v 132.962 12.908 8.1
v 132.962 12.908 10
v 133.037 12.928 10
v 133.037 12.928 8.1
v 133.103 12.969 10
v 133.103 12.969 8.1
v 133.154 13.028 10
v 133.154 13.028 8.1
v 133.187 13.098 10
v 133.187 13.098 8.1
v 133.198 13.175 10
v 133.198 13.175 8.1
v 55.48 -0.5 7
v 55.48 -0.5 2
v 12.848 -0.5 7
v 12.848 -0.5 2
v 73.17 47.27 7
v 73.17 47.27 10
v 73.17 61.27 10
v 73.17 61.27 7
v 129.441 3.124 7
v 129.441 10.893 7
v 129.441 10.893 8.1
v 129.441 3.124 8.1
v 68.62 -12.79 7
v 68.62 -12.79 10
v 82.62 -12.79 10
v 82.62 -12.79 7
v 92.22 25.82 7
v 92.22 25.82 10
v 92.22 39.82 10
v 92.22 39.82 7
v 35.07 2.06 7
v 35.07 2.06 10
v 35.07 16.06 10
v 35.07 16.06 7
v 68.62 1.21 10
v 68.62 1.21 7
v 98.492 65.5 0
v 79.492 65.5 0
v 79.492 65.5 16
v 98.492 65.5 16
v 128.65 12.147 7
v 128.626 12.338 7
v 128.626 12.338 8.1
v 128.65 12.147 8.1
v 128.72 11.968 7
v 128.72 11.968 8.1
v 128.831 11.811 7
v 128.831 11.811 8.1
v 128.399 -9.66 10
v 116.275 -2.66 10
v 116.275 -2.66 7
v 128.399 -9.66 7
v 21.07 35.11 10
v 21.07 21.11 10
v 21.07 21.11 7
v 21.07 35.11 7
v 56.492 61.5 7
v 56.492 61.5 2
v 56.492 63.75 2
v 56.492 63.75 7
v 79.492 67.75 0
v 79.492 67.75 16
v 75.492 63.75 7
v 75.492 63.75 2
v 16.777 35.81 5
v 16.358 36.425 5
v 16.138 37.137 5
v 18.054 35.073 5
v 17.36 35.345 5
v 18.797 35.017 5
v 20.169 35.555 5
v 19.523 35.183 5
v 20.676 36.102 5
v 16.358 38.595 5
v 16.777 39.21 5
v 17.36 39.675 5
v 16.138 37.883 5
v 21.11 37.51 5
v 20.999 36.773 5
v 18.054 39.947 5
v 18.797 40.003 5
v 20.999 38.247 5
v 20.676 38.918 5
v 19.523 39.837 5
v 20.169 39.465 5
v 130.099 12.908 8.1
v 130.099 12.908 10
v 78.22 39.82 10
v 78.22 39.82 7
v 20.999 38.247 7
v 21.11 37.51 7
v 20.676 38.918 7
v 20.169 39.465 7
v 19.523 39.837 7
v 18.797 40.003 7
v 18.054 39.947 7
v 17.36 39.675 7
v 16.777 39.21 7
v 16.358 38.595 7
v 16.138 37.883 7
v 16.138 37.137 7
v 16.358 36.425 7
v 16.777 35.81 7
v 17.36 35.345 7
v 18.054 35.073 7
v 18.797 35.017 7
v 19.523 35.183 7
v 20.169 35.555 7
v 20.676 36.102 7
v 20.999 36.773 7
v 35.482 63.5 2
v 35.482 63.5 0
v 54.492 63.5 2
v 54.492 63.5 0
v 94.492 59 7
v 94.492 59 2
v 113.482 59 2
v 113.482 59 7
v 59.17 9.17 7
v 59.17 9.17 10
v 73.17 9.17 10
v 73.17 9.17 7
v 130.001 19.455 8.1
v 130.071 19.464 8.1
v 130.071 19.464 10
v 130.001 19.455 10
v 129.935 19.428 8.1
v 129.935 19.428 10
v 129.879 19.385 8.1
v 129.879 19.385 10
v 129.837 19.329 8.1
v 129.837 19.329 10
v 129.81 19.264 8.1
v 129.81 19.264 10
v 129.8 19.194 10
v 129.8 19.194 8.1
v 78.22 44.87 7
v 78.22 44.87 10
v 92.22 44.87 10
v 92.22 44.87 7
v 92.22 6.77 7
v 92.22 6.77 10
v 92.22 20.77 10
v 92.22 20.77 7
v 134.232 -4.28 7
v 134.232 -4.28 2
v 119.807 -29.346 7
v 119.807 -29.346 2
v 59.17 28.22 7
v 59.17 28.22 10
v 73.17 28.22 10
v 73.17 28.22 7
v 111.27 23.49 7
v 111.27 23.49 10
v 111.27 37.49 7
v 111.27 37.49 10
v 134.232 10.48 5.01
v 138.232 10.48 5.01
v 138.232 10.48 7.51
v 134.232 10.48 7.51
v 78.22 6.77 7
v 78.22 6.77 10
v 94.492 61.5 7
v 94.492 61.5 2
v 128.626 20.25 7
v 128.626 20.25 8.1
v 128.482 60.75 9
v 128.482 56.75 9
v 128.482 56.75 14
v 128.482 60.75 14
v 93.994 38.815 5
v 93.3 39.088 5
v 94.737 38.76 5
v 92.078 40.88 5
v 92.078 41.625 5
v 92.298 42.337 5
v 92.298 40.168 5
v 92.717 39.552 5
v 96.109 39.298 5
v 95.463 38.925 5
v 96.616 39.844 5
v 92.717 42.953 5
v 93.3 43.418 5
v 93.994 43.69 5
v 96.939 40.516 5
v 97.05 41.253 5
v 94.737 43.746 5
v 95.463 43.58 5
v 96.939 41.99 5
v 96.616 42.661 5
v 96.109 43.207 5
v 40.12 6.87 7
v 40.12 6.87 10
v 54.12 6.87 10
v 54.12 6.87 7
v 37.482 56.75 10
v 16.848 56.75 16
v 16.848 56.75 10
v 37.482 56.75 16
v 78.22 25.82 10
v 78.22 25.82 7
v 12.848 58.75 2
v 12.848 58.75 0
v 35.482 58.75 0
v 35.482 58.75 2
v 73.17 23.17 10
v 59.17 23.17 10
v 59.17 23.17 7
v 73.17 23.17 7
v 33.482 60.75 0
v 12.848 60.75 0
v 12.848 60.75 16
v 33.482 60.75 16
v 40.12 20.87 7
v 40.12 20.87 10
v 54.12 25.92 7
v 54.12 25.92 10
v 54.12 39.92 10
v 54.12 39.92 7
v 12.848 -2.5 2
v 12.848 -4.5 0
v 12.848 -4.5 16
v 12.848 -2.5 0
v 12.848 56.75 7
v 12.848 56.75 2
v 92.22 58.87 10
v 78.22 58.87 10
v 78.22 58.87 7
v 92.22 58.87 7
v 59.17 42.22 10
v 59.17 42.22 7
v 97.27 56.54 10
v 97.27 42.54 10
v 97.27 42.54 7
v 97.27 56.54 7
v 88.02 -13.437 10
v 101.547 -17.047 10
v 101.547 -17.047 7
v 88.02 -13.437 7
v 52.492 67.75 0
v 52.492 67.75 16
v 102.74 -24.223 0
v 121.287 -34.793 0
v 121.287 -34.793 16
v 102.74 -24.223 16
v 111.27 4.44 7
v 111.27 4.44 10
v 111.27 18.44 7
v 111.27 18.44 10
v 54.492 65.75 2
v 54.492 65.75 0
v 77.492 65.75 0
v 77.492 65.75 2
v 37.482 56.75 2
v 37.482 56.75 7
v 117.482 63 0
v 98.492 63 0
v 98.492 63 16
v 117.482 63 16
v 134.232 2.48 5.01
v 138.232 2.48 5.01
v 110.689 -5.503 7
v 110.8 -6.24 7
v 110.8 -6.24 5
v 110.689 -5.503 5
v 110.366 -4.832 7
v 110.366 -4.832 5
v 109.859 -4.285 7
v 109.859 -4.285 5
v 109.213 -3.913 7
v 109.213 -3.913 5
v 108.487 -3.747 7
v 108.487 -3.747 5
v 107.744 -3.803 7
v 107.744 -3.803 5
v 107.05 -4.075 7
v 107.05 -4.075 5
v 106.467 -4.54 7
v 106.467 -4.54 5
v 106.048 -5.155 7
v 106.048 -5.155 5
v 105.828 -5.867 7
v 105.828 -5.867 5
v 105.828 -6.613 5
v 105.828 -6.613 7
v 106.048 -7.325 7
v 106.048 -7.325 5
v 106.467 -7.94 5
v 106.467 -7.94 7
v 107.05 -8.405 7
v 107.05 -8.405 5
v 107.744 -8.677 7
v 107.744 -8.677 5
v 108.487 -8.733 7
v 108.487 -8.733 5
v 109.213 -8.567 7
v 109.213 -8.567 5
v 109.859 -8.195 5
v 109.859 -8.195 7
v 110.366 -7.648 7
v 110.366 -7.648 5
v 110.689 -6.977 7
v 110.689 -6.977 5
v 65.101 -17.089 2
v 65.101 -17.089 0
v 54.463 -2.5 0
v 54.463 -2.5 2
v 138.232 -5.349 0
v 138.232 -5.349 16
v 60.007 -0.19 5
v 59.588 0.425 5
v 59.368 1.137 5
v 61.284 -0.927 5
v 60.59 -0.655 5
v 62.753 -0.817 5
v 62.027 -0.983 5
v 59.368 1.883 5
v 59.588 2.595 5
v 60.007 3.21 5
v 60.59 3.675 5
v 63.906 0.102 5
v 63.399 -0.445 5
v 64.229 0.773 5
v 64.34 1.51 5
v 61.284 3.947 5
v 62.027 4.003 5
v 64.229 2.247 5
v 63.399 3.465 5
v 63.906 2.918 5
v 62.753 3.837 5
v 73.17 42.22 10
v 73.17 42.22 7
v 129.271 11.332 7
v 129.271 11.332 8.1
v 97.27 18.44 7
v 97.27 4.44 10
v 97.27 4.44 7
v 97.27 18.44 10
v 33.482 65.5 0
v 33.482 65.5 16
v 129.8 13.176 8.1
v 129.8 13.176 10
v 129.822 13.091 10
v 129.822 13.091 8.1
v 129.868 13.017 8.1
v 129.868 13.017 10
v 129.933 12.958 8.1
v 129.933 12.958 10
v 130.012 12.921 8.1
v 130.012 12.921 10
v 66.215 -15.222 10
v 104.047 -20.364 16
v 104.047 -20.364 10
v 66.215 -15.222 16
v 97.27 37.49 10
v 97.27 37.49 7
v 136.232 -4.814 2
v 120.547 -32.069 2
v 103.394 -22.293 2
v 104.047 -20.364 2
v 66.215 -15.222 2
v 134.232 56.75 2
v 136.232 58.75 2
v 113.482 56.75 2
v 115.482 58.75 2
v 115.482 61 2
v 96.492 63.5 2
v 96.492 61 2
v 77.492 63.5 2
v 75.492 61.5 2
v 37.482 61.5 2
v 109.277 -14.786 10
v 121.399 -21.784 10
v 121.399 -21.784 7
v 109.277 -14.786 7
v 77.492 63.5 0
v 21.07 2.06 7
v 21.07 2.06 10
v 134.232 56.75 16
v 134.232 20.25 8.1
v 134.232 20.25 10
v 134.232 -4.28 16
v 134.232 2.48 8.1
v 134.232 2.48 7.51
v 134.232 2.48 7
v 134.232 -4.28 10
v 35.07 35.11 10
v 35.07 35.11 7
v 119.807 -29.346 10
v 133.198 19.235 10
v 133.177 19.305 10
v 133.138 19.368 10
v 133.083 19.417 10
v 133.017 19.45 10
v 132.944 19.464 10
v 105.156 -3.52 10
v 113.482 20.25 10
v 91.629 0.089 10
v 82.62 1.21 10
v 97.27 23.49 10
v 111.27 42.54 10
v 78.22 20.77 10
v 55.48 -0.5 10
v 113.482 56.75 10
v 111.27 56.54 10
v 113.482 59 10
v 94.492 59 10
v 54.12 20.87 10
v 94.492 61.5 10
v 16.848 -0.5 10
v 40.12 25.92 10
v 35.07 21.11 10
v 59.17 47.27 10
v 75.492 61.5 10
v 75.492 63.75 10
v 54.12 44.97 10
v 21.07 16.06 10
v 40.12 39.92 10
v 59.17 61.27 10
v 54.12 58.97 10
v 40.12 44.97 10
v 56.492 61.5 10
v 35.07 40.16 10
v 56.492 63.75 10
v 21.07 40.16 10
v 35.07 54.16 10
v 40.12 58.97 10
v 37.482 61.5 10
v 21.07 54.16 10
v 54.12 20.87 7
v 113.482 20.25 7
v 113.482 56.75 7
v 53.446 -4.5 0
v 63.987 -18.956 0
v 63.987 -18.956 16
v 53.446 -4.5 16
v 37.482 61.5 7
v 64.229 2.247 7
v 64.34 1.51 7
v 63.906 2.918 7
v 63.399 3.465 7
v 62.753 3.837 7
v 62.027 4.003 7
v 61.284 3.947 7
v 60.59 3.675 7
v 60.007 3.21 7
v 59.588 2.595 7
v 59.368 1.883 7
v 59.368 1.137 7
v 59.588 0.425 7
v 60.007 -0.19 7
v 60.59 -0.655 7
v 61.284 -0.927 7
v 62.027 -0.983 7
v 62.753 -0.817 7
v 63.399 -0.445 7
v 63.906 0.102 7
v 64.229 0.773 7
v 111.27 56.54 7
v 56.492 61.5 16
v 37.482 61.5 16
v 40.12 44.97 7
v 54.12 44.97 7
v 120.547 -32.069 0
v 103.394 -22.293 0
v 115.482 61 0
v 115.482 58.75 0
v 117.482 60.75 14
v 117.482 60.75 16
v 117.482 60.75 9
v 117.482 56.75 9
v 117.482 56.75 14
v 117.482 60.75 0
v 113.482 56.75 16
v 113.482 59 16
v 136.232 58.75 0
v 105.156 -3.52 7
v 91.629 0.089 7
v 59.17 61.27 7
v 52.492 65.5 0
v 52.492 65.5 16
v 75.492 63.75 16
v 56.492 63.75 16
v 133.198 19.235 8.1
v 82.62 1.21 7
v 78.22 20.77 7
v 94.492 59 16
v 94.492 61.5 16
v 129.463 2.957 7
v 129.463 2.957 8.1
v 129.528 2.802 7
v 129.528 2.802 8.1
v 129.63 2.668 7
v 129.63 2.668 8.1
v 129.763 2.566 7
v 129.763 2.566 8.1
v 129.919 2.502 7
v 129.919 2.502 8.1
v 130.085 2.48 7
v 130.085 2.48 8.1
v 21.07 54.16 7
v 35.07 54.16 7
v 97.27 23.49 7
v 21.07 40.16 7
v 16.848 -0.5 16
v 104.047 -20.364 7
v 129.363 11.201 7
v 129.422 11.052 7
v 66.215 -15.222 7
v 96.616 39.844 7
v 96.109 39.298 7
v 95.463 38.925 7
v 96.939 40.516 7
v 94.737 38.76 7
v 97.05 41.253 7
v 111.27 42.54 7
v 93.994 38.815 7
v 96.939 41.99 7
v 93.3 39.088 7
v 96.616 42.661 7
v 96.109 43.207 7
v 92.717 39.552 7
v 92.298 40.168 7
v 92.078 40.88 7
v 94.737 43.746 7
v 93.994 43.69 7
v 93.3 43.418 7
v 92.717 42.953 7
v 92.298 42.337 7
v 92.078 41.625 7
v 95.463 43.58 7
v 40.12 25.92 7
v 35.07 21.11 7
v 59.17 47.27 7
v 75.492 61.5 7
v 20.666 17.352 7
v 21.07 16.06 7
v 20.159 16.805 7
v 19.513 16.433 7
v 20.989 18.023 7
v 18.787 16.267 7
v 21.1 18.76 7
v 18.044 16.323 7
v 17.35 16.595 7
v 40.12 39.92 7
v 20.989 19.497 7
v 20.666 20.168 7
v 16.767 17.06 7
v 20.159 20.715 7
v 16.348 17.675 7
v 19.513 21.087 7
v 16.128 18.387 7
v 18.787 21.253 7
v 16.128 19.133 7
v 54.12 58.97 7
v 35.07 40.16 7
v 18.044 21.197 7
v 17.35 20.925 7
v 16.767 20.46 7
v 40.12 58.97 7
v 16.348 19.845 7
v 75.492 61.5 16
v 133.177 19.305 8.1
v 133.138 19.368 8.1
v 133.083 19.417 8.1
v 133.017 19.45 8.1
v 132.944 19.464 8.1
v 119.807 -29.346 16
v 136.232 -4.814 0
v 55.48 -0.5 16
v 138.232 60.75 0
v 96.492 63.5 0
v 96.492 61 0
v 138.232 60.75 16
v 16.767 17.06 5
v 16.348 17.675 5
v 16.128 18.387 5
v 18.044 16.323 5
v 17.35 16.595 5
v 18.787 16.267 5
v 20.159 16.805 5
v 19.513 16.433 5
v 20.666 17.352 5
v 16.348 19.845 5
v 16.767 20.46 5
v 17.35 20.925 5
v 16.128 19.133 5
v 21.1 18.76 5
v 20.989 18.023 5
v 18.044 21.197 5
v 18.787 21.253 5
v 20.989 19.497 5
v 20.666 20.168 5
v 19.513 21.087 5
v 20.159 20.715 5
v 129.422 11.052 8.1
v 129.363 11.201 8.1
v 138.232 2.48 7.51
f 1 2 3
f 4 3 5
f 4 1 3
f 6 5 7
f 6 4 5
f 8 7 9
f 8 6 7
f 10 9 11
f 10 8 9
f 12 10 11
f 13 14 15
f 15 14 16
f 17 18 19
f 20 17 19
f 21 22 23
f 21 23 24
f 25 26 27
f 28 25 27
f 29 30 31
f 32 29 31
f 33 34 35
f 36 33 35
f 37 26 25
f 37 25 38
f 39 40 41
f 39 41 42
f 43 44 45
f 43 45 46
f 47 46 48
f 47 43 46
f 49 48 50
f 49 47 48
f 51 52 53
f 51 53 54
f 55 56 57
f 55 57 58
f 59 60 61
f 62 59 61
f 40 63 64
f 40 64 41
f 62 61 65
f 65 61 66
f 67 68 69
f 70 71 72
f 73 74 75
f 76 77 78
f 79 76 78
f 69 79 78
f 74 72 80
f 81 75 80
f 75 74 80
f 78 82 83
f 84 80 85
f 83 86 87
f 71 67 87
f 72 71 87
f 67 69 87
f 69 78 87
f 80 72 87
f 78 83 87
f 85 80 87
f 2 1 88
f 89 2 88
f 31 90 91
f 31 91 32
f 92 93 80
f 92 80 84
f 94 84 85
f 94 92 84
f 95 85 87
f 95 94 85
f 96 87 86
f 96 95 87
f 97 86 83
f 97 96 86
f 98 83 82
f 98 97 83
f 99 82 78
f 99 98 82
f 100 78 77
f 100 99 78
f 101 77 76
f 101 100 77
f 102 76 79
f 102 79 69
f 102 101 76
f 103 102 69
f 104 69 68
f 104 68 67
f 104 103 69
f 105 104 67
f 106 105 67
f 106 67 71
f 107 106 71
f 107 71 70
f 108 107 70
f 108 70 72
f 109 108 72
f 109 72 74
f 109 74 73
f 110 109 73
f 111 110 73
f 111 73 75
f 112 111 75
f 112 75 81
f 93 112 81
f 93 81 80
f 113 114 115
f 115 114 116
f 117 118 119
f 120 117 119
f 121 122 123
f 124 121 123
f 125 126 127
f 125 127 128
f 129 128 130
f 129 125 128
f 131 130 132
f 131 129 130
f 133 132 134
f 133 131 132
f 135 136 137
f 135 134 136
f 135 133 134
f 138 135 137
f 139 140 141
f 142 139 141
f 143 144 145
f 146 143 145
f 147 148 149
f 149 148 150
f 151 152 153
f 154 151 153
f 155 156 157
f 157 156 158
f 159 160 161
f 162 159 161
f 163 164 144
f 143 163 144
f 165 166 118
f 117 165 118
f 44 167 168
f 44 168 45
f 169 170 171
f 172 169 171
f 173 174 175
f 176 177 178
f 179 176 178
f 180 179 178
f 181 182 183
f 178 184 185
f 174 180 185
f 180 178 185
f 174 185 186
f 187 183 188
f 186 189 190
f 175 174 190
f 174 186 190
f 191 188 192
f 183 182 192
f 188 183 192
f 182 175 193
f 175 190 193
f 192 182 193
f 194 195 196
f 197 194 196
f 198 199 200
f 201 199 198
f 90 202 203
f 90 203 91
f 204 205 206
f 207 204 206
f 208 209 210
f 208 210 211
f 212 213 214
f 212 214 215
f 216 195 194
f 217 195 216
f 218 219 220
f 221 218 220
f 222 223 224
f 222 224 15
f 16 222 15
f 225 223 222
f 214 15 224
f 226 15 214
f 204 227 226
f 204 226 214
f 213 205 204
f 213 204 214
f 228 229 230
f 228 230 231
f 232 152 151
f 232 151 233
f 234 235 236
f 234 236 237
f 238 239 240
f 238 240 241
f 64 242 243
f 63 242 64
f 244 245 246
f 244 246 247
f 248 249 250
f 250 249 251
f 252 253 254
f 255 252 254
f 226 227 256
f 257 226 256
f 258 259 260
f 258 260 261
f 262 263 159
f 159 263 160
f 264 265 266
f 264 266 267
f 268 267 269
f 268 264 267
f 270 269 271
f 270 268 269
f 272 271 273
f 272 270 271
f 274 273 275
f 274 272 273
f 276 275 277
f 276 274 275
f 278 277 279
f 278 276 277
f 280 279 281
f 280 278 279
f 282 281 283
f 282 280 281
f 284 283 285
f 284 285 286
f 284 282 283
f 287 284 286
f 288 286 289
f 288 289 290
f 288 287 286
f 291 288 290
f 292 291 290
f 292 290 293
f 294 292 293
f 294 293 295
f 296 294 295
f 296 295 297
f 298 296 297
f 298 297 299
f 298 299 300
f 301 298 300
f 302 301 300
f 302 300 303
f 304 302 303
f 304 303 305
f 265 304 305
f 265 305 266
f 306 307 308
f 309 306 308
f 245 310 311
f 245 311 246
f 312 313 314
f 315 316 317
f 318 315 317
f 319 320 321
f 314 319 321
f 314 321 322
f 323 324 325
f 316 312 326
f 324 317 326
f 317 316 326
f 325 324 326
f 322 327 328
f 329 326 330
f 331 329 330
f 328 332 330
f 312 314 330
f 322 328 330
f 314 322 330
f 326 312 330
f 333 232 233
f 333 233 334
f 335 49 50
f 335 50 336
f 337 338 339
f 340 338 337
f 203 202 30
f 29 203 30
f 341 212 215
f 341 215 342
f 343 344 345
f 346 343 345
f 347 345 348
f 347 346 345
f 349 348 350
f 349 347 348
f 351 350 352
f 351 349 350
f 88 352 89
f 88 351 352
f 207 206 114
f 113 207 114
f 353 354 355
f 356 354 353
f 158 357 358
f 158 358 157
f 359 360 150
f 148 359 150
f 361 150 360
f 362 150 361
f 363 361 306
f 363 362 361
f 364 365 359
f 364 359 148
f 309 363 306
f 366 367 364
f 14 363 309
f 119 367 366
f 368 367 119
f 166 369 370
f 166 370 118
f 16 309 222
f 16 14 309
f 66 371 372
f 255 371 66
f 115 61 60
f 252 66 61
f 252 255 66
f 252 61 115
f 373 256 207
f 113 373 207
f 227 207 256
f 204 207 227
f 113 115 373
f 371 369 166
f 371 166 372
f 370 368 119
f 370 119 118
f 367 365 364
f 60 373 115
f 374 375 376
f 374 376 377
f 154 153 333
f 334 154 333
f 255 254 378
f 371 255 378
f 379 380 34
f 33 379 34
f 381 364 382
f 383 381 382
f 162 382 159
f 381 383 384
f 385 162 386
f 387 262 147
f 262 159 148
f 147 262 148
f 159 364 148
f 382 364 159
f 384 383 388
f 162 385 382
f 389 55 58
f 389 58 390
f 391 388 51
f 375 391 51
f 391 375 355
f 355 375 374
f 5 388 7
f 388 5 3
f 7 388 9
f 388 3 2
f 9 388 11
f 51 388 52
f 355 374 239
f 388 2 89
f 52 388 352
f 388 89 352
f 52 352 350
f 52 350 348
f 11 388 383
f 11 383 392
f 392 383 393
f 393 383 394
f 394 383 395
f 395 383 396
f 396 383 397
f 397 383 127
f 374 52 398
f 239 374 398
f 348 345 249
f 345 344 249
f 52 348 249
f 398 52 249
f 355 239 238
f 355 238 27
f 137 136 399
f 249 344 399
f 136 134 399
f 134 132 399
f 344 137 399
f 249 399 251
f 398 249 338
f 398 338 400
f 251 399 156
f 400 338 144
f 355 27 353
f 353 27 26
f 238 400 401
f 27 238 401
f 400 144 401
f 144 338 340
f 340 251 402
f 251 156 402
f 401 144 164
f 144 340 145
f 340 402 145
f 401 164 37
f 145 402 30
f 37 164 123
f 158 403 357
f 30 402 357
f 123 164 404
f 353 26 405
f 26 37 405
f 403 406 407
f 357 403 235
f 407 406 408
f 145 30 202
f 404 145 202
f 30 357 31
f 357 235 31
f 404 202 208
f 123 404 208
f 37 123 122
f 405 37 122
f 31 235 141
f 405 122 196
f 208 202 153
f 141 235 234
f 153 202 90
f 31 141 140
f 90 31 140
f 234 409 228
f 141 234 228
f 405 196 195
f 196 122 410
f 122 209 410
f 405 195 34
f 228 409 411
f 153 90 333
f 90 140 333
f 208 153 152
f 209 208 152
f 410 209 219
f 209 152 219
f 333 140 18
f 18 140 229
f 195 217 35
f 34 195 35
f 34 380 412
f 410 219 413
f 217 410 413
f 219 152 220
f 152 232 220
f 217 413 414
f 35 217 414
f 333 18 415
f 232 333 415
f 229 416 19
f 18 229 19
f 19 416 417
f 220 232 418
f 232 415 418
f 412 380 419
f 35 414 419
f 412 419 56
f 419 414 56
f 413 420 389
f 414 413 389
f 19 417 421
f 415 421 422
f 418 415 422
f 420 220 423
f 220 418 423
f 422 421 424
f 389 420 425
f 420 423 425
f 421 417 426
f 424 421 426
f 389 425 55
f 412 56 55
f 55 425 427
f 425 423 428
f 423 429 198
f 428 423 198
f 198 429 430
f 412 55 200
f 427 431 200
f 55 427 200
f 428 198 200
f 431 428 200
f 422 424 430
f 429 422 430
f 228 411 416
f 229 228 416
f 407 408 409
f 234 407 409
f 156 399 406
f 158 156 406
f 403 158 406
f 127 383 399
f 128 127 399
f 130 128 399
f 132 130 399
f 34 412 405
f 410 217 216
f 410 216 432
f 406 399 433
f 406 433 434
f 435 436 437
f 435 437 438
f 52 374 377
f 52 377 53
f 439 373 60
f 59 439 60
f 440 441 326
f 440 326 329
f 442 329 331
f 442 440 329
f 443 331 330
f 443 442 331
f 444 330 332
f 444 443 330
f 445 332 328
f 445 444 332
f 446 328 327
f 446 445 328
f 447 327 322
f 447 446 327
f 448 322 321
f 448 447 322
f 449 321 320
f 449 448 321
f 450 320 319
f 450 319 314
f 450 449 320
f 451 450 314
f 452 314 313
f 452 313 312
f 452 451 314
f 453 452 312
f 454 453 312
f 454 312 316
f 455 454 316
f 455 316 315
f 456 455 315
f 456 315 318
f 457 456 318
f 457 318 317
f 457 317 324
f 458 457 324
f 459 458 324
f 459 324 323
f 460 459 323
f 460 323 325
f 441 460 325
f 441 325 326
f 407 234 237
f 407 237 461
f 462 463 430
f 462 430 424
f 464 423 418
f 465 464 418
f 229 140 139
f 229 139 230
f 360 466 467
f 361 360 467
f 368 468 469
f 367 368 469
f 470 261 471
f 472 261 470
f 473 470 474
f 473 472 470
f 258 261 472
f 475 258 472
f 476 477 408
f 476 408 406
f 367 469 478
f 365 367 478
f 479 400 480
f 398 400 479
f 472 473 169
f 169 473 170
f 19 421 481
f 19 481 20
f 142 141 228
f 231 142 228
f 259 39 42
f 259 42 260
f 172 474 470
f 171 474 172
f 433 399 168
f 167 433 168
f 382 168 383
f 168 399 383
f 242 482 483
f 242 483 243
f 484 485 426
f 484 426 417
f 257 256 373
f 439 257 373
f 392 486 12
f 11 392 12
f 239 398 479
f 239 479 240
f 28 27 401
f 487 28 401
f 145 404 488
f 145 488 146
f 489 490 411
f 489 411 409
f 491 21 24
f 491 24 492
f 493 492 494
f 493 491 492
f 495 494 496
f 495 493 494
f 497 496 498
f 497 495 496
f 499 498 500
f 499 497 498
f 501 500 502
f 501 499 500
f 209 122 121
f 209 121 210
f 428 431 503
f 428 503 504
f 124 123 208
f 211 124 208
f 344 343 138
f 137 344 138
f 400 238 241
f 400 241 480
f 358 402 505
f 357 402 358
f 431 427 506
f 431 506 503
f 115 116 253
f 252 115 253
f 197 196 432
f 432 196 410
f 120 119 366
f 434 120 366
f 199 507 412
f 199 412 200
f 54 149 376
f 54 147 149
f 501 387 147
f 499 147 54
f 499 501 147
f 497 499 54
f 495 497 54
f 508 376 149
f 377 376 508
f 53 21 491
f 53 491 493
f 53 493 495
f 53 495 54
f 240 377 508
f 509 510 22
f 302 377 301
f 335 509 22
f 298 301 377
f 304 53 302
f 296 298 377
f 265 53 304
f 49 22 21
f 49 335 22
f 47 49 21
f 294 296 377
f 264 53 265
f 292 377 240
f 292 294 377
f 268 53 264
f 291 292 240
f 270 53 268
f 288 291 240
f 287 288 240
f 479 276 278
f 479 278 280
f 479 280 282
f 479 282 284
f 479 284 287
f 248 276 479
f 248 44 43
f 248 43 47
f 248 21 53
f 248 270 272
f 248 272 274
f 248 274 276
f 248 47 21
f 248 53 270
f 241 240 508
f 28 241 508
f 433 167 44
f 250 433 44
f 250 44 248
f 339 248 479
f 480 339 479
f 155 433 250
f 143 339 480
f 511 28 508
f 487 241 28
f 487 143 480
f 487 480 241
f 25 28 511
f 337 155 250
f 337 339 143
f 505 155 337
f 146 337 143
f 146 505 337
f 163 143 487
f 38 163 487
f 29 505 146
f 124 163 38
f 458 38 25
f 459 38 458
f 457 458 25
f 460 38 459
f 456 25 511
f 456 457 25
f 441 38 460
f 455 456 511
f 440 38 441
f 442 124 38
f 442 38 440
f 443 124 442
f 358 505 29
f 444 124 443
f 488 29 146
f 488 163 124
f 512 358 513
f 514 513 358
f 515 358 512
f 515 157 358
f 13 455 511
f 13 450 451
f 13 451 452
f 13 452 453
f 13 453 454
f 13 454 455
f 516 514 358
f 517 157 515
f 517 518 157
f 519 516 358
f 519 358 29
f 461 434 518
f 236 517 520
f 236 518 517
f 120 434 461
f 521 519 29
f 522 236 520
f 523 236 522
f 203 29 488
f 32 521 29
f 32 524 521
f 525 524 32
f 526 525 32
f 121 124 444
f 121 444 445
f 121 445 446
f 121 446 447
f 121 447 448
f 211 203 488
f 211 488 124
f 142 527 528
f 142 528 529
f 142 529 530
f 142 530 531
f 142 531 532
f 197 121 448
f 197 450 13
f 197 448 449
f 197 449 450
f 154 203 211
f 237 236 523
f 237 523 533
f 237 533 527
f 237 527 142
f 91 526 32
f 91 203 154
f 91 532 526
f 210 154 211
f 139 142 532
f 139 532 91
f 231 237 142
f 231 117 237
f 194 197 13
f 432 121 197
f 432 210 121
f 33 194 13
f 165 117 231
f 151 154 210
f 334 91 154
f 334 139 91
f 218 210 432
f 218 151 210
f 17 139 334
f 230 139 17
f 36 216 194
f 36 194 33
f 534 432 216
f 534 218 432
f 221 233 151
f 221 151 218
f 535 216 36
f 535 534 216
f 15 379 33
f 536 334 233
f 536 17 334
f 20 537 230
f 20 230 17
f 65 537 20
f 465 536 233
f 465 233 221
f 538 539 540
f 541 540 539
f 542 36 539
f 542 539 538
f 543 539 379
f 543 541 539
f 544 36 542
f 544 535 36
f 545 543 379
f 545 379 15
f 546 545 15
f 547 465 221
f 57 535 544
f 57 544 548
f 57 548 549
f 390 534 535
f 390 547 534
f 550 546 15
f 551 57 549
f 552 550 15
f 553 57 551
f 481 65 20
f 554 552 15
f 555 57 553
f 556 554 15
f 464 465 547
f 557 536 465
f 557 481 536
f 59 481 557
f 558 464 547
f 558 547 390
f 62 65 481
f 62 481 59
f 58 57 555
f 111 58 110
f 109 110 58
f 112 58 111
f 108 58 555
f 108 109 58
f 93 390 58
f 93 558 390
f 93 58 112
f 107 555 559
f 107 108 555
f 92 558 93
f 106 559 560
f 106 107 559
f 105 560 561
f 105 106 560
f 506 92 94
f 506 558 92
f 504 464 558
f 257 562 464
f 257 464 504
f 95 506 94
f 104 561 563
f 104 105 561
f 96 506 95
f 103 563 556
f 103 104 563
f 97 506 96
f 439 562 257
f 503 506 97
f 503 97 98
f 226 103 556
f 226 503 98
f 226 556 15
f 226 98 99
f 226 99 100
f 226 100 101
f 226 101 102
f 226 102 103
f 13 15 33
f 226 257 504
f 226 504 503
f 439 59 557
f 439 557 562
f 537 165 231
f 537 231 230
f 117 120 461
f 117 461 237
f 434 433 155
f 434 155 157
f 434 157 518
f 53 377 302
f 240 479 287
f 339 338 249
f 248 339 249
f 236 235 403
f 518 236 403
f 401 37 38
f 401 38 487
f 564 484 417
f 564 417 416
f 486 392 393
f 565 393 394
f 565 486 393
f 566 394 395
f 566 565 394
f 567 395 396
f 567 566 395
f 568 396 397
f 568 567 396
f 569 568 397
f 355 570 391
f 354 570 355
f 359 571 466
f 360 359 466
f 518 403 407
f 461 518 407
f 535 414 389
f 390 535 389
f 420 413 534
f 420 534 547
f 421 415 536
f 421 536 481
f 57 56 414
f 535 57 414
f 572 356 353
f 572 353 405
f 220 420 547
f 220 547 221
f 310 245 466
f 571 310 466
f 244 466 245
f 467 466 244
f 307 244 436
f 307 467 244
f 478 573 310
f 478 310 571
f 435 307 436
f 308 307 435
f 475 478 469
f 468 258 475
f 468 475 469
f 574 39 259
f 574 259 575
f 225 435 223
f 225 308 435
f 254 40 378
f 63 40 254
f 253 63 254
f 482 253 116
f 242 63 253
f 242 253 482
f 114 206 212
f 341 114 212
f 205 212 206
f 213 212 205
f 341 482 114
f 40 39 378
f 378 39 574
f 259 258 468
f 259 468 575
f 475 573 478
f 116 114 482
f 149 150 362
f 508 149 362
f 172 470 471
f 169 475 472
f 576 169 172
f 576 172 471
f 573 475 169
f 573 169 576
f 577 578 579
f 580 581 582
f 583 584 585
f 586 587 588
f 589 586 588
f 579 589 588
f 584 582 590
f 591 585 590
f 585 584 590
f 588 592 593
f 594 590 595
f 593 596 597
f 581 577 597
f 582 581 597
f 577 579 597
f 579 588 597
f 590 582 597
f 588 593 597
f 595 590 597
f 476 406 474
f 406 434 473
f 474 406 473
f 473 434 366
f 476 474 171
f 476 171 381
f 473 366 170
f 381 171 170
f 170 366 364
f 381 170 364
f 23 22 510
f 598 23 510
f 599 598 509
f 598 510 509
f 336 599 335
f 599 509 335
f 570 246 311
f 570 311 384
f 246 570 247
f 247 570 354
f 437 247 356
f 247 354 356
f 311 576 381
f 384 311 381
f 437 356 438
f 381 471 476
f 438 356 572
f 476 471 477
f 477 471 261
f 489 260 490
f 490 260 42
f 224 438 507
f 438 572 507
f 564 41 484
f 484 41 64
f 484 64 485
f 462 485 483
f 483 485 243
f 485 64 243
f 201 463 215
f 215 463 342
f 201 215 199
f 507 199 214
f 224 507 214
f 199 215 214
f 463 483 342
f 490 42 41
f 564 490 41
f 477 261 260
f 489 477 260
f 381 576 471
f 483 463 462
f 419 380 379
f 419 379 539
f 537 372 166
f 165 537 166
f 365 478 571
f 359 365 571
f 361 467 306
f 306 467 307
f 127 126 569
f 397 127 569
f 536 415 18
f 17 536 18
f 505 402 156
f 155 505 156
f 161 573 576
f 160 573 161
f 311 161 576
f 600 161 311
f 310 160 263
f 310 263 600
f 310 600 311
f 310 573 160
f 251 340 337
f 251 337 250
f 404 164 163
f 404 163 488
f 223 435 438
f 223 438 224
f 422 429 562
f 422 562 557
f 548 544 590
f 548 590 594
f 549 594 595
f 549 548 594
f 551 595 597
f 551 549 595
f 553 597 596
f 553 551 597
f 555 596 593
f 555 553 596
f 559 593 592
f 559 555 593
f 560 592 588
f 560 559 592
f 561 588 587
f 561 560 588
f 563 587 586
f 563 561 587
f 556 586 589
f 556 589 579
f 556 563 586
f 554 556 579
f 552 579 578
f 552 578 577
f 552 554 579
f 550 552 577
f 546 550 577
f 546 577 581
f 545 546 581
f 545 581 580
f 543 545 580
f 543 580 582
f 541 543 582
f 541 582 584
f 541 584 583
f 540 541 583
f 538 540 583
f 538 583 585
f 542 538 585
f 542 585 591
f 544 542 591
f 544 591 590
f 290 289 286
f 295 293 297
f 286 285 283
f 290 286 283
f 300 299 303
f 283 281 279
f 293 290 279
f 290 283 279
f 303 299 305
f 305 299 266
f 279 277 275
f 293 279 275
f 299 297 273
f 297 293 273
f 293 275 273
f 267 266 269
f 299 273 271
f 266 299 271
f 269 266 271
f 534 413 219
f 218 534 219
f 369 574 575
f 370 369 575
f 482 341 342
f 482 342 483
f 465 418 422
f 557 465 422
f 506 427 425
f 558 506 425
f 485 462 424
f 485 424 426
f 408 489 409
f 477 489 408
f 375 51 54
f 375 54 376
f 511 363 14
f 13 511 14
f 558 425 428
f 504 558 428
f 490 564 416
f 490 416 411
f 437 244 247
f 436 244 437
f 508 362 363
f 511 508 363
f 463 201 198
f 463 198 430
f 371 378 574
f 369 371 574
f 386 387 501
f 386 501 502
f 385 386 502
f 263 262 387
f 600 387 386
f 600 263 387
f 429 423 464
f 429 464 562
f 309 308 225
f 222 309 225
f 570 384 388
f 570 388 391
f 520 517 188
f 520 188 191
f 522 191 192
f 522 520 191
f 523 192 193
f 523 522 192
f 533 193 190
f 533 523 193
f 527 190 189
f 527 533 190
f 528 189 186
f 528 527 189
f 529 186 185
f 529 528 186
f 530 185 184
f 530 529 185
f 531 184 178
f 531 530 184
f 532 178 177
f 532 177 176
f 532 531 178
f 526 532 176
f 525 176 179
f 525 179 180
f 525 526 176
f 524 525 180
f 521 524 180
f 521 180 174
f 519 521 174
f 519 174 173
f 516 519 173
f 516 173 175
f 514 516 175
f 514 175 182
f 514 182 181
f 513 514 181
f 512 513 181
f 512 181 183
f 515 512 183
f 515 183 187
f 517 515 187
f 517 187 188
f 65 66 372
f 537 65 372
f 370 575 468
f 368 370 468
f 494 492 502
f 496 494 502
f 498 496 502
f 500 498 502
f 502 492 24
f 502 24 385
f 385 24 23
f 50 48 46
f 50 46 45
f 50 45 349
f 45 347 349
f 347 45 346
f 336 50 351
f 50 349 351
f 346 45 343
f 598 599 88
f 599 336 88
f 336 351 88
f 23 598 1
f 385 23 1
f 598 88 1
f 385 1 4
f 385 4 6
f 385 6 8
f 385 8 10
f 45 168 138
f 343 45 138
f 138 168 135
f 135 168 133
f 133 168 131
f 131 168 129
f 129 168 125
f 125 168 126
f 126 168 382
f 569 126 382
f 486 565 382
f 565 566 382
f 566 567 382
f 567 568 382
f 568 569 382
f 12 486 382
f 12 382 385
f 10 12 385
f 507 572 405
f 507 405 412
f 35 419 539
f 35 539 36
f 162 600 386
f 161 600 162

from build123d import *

# Parameters (mm, degrees)
PAD005_DEPTH        = 16
POCKET_DEPTH        = 6
POCKET012_DEPTH     = 7
SKETCH001_W         = 14
SKETCH001_H         = 14
SKETCH001_W_2       = 20.75
SKETCH001_H_2       = 36.5
POCKET013_DEPTH     = 3
MIRROREDSKETCH009_R = 2.5
PAD_DEPTH           = 5
SKETCH_W            = 8
SKETCH_H            = 2.5
POCKET014_DEPTH     = 5
SKETCH015_W         = 11
SKETCH015_H         = 5
POCKET015_DEPTH     = 7
POCKET018_DEPTH     = 2
POCKET025_DEPTH     = 5
POCKET026_DEPTH     = 1.1


with BuildPart() as part:
    # MirroredSketch002 → Pad005 (new body)
    with BuildSketch(Plane.XY):
        Polygon((12.847899, 60.749919), (33.482443, 60.749919), (33.482443, 65.499919), (52.492443, 65.499919), (52.492443, 67.749919), (79.492443, 67.749919), (79.492443, 65.499919), (98.492443, 65.499919), (98.492443, 62.999919), (117.482443, 62.999919), (117.482443, 60.749919), (138.232443, 60.749919), (138.232443, -5.348885), (121.287497, -34.793261), (102.74032, -24.222717), (63.98748, -18.955575), (53.446293, -4.5), (12.847899, -4.5), align=None)
    extrude(amount=PAD005_DEPTH)

    # MirroredSketch005 → Pocket (cut)
    with BuildSketch(Plane.XY.offset(16)):
        Polygon((16.847899, -0.5), (16.847899, 56.75), (37.482443, 56.75), (37.482443, 61.499919), (56.492443, 61.499919), (56.492443, 63.749919), (75.492443, 63.749919), (75.492443, 61.499919), (94.492443, 61.499919), (94.492443, 58.999919), (113.482443, 58.999919), (113.482443, 56.749919), (134.232443, 56.749919), (134.232443, -4.280081), (119.807428, -29.345701), (104.047316, -20.363581), (66.215158, -15.221576), (55.48, -0.5), align=None)
    extrude(amount=-POCKET_DEPTH, mode=Mode.SUBTRACT)

    # MirroredSketch006 → Pocket012 (cut)
    with BuildSketch(Plane.XY):
        Polygon((-0.5, -0.5), (-0.5, 56.75), (37.482443, 56.75), (37.482443, 61.499919), (56.492443, 61.499919), (56.492443, 63.749919), (75.492443, 63.749919), (75.492443, 61.499919), (94.492443, 61.499919), (94.492443, 58.999919), (113.482443, 58.999919), (113.482443, 56.749919), (134.232443, 56.749919), (134.232443, -4.280081), (119.807428, -29.345701), (104.047316, -20.363581), (66.215158, -15.221576), (55.48, -0.5), align=None)
    extrude(amount=POCKET012_DEPTH, mode=Mode.SUBTRACT)

    # Sketch001 → Pocket013 (cut)
    with BuildSketch(Plane.XY.offset(10)):
        with Locations((75.62, -5.79)):
            Rectangle(SKETCH001_W, SKETCH001_H)
        Polygon((91.629303, 0.089303), (105.156052, -3.52), (101.546749, -17.046749), (88.02, -13.437445), align=None)
        Polygon((116.274632, -2.66), (128.398988, -9.66), (121.398988, -21.784355), (109.276749, -14.785577), align=None)
        with Locations((28.07, 47.16)):
            Rectangle(SKETCH001_W, SKETCH001_H)
        with Locations((28.07, 9.06)):
            Rectangle(SKETCH001_W, SKETCH001_H)
        with Locations((47.12, 51.97)):
            Rectangle(SKETCH001_W, SKETCH001_H)
        with Locations((47.12, 13.87)):
            Rectangle(SKETCH001_W, SKETCH001_H)
        with Locations((66.17, 54.27)):
            Rectangle(SKETCH001_W, SKETCH001_H)
        with Locations((66.17, 16.17)):
            Rectangle(SKETCH001_W, SKETCH001_H)
        with Locations((85.22, 51.87)):
            Rectangle(SKETCH001_W, SKETCH001_H)
        with Locations((85.22, 13.77)):
            Rectangle(SKETCH001_W, SKETCH001_H)
        with Locations((104.27, 49.54)):
            Rectangle(SKETCH001_W, SKETCH001_H)
        with Locations((47.12, 32.92)):
            Rectangle(SKETCH001_W, SKETCH001_H)
        with Locations((66.17, 35.22)):
            Rectangle(SKETCH001_W, SKETCH001_H)
        with Locations((28.07, 28.11)):
            Rectangle(SKETCH001_W, SKETCH001_H)
        with Locations((104.27, 30.49)):
            Rectangle(SKETCH001_W, SKETCH001_H)
        with Locations((104.27, 11.44)):
            Rectangle(SKETCH001_W, SKETCH001_H)
        with Locations((85.22, 32.82)):
            Rectangle(SKETCH001_W, SKETCH001_H)
        with Locations((123.857443, 38.499919)):
            Rectangle(SKETCH001_W_2, SKETCH001_H_2)
    extrude(amount=-POCKET013_DEPTH, mode=Mode.SUBTRACT)

    # MirroredSketch009 → Pad (join)
    with BuildSketch(Plane.XY.offset(10)):
        with Locations((18.61, 37.509997)):
            Circle(MIRROREDSKETCH009_R)
        with Locations((18.6, 18.76)):
            Circle(MIRROREDSKETCH009_R)
        with Locations((94.55, 41.252659)):
            Circle(MIRROREDSKETCH009_R)
        with Locations((61.84, 1.51)):
            Circle(MIRROREDSKETCH009_R)
        with Locations((108.3, -6.24)):
            Circle(MIRROREDSKETCH009_R)
    extrude(amount=-PAD_DEPTH)

    # Sketch → Pocket014 (cut)
    with BuildSketch(Plane.YZ.offset(138.3)):
        with Locations((6.479556, 6.26)):
            Rectangle(SKETCH_W, SKETCH_H)
    extrude(amount=-POCKET014_DEPTH, mode=Mode.SUBTRACT)

    # Sketch015 → Pocket015 (cut)
    with BuildSketch(Plane(origin=(6, 56.73, -16.55), x_dir=(1, 0, 0), z_dir=(0, -1, 0))):
        with Locations((116.982443, 28.05)):
            Rectangle(SKETCH015_W, SKETCH015_H)
    extrude(amount=-POCKET015_DEPTH, mode=Mode.SUBTRACT)

    # MirroredSketch013 → Pocket018 (cut)
    with BuildSketch(Plane.XY):
        Polygon((-2.5, 58.75), (35.482443, 58.75), (35.482443, 63.499919), (54.492443, 63.499919), (54.492443, 65.749919), (77.492443, 65.749919), (77.492443, 63.499919), (96.492443, 63.499919), (96.492443, 60.999919), (115.482443, 60.999919), (115.482443, 58.749919), (136.232443, 58.749919), (136.232443, -4.814483), (120.547462, -32.069481), (103.393818, -22.293149), (65.101319, -17.088576), (54.463147, -2.5), (-2.5, -2.5), align=None)
        Polygon((-0.5, -0.5), (-0.5, 56.75), (37.482443, 56.75), (37.482443, 61.499919), (56.492443, 61.499919), (56.492443, 63.749919), (75.492443, 63.749919), (75.492443, 61.499919), (94.492443, 61.499919), (94.492443, 58.999919), (113.482443, 58.999919), (113.482443, 56.749919), (134.232443, 56.749919), (134.232443, -4.280081), (119.807428, -29.345701), (104.047316, -20.363581), (66.215158, -15.221576), (55.48, -0.5), align=None, mode=Mode.SUBTRACT)
    extrude(amount=POCKET018_DEPTH, mode=Mode.SUBTRACT)

    # Sketch042 → Pocket025 (cut)
    with BuildSketch(Plane(origin=(131.5, 16.2, 8.1), x_dir=(1, 0, 0), z_dir=(0, 0, 1))):
        with BuildLine():
            ThreePointArc((-1.699662, -3.023679), (-1.602072, -3.215198), (-1.401398, -3.292227))
            Line((1.461956, -3.292227), (-1.401398, -3.292227))
            ThreePointArc((1.461956, -3.292227), (1.630798, -3.203454), (1.698398, -3.025076))
            Line((1.698398, 3.034671), (1.698398, -3.025076))
            ThreePointArc((1.698398, 3.034671), (1.611903, 3.194523), (1.444123, 3.264409))
            Line((-1.429415, 3.264409), (1.444123, 3.264409))
            ThreePointArc((-1.429415, 3.264409), (-1.620509, 3.185256), (-1.699662, 2.994162))
            Line((-1.699662, -3.023679), (-1.699662, 2.994162))
        make_face()
    extrude(amount=POCKET025_DEPTH, mode=Mode.SUBTRACT)

    # Sketch045 → Pocket026 (cut)
    with BuildSketch(Plane.XY.offset(7)):
        with BuildLine():
            Line((128.626114, 20.249919), (128.626114, 12.337918))
            ThreePointArc((128.626114, 12.337918), (128.679151, 12.055368), (128.83104, 11.811285))
            Line((128.83104, 11.811285), (129.270661, 11.331936))
            ThreePointArc((129.4413, 10.893416), (129.397137, 11.128691), (129.270661, 11.331936))
            Line((129.4413, 10.893416), (129.4413, 3.123712))
            ThreePointArc((129.4413, 3.123712), (129.629969, 2.668225), (130.085456, 2.479556))
            Line((130.085456, 2.479556), (134.232443, 2.479556))
            Line((134.232443, 20.249919), (134.232443, 2.479556))
            Line((128.626114, 20.249919), (134.232443, 20.249919))
        make_face()
    extrude(amount=POCKET026_DEPTH, mode=Mode.SUBTRACT)


solid = part.part
